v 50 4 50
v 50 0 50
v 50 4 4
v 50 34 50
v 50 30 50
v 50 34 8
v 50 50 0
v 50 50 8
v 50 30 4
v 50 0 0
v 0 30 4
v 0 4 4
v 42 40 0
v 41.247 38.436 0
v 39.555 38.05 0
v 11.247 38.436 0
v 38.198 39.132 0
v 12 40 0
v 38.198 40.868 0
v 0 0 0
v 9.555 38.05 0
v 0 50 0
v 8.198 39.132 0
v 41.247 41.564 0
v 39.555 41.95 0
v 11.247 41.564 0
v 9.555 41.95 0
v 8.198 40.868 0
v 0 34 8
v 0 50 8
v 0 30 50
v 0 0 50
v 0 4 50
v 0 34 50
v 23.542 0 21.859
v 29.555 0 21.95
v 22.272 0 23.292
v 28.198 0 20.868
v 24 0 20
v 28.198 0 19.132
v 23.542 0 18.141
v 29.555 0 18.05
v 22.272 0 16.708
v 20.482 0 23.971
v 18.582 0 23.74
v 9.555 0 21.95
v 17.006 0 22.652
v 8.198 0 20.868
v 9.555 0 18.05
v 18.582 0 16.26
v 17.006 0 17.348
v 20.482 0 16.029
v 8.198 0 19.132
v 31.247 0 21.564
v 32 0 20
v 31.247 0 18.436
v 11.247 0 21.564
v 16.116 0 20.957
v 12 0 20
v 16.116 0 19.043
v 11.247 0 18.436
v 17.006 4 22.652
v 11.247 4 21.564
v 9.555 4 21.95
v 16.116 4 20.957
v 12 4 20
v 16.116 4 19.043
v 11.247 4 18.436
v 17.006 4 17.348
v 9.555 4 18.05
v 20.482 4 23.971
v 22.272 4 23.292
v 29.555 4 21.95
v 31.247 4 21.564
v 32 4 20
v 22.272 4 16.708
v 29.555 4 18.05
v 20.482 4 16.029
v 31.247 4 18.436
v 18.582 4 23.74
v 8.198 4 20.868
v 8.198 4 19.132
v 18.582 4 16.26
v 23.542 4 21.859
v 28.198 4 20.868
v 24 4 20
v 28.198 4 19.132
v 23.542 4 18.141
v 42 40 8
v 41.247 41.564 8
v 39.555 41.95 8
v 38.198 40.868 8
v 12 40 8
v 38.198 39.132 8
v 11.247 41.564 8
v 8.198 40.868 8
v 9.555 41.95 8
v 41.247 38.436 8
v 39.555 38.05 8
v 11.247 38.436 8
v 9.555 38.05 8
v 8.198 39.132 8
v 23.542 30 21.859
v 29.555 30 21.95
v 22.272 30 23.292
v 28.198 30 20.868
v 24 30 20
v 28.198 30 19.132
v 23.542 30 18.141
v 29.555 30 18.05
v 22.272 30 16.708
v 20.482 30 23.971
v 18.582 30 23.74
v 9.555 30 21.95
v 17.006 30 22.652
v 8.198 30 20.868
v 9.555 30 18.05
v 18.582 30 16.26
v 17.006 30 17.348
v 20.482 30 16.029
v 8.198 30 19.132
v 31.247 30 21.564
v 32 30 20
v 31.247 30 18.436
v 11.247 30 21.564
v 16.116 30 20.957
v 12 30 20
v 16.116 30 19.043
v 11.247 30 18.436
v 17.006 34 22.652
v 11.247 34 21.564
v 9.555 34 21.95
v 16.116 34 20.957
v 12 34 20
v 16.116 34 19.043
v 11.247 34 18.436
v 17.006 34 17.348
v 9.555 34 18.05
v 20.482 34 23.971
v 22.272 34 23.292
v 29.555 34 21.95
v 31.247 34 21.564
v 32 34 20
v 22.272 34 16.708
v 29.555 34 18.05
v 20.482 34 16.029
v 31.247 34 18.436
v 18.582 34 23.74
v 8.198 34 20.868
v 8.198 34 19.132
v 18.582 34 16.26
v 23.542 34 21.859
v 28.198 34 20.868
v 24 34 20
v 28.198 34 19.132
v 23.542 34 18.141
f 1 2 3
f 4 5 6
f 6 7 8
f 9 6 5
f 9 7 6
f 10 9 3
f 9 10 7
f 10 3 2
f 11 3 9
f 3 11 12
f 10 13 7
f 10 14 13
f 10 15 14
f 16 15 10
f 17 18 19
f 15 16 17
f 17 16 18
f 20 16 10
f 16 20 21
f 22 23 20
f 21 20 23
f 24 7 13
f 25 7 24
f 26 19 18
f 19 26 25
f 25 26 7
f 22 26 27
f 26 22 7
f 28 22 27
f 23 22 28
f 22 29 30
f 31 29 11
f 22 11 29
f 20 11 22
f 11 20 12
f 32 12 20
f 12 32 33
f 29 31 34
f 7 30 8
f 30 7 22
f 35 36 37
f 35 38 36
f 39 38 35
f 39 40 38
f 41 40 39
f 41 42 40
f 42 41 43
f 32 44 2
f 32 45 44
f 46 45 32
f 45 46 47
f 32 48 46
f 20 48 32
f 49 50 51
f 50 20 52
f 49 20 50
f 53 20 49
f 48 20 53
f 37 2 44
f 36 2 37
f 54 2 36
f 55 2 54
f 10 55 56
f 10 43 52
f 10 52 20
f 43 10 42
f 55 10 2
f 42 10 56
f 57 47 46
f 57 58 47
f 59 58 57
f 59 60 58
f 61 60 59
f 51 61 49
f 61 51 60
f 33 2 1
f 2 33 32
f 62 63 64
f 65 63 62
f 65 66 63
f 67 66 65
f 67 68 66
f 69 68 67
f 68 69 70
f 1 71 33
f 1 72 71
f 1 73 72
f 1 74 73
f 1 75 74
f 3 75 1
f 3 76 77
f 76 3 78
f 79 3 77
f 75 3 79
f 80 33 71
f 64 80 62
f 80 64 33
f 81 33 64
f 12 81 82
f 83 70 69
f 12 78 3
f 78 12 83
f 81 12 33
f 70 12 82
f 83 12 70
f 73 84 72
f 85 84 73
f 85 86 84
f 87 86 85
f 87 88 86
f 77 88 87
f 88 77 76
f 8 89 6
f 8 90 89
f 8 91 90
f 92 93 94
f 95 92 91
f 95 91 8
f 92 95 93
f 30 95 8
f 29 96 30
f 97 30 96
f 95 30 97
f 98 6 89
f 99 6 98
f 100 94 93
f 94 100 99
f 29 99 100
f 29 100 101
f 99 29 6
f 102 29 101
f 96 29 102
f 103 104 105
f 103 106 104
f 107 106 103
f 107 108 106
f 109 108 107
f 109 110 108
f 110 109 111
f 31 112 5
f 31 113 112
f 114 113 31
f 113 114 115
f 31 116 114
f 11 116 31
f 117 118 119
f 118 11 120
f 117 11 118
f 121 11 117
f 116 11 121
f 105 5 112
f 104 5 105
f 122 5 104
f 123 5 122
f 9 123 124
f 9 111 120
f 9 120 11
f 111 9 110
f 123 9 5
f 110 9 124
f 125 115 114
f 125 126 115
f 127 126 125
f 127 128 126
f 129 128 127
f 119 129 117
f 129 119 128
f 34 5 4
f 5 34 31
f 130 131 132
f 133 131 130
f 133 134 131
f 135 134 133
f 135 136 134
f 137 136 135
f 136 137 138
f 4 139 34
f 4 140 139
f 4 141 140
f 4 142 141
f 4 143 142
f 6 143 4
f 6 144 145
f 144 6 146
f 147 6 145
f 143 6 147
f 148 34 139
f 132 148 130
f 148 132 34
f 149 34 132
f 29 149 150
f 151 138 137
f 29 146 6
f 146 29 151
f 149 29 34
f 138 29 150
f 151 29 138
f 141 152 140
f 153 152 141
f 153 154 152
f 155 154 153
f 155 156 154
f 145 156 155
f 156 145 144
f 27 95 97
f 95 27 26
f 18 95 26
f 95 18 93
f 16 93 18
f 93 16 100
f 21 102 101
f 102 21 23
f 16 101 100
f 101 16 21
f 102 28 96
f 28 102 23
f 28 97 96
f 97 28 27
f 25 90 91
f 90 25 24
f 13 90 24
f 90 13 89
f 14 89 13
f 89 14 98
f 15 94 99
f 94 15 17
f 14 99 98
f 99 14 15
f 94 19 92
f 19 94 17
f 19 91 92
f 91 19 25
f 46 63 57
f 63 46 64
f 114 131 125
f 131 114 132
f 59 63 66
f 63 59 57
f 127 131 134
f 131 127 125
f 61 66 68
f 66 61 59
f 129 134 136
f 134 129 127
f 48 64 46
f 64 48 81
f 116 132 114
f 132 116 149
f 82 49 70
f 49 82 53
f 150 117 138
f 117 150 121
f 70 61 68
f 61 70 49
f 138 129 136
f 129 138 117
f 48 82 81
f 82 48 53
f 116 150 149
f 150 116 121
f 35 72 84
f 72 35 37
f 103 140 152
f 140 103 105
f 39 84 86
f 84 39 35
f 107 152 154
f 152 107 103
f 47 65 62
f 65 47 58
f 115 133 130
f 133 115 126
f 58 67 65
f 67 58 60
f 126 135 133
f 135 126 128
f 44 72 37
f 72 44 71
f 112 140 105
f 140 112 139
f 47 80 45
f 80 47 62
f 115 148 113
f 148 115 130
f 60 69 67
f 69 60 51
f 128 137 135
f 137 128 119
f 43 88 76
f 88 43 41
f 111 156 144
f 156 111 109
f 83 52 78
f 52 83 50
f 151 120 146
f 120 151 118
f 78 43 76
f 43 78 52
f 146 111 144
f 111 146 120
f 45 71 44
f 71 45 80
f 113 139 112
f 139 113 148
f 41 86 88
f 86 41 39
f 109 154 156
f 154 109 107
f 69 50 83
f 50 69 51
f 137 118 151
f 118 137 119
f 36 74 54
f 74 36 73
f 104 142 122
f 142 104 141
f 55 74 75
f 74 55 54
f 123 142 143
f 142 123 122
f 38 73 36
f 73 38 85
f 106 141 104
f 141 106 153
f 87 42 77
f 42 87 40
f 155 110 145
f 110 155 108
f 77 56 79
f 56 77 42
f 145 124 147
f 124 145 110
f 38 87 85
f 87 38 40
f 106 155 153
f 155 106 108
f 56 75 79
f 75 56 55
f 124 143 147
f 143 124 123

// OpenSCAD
module angolare(a,b,h,sp){
    cube([a,b,sp],false);
    cube([a,sp,h],false);
}

difference(){
union(){
angolare(50,50,50,4);

color("red")
translate([0,50-20,4])
angolare(50,20,50-4,4);
}

//fori cilindrici verticali
translate([10,40,0]) cylinder(40,2,2,true);
translate([40,40,0]) cylinder(40,2,2,true);

//fori cilindrici orizzontali
translate([10,0,20])  rotate([90,0,0])
    #cylinder(100,2,2,true);
translate([20,0,20])  rotate([90,0,0])
    #cylinder(100,4,4,true);
translate([30,0,20])  rotate([90,0,0])
    #cylinder(100,2,2,true);
}
